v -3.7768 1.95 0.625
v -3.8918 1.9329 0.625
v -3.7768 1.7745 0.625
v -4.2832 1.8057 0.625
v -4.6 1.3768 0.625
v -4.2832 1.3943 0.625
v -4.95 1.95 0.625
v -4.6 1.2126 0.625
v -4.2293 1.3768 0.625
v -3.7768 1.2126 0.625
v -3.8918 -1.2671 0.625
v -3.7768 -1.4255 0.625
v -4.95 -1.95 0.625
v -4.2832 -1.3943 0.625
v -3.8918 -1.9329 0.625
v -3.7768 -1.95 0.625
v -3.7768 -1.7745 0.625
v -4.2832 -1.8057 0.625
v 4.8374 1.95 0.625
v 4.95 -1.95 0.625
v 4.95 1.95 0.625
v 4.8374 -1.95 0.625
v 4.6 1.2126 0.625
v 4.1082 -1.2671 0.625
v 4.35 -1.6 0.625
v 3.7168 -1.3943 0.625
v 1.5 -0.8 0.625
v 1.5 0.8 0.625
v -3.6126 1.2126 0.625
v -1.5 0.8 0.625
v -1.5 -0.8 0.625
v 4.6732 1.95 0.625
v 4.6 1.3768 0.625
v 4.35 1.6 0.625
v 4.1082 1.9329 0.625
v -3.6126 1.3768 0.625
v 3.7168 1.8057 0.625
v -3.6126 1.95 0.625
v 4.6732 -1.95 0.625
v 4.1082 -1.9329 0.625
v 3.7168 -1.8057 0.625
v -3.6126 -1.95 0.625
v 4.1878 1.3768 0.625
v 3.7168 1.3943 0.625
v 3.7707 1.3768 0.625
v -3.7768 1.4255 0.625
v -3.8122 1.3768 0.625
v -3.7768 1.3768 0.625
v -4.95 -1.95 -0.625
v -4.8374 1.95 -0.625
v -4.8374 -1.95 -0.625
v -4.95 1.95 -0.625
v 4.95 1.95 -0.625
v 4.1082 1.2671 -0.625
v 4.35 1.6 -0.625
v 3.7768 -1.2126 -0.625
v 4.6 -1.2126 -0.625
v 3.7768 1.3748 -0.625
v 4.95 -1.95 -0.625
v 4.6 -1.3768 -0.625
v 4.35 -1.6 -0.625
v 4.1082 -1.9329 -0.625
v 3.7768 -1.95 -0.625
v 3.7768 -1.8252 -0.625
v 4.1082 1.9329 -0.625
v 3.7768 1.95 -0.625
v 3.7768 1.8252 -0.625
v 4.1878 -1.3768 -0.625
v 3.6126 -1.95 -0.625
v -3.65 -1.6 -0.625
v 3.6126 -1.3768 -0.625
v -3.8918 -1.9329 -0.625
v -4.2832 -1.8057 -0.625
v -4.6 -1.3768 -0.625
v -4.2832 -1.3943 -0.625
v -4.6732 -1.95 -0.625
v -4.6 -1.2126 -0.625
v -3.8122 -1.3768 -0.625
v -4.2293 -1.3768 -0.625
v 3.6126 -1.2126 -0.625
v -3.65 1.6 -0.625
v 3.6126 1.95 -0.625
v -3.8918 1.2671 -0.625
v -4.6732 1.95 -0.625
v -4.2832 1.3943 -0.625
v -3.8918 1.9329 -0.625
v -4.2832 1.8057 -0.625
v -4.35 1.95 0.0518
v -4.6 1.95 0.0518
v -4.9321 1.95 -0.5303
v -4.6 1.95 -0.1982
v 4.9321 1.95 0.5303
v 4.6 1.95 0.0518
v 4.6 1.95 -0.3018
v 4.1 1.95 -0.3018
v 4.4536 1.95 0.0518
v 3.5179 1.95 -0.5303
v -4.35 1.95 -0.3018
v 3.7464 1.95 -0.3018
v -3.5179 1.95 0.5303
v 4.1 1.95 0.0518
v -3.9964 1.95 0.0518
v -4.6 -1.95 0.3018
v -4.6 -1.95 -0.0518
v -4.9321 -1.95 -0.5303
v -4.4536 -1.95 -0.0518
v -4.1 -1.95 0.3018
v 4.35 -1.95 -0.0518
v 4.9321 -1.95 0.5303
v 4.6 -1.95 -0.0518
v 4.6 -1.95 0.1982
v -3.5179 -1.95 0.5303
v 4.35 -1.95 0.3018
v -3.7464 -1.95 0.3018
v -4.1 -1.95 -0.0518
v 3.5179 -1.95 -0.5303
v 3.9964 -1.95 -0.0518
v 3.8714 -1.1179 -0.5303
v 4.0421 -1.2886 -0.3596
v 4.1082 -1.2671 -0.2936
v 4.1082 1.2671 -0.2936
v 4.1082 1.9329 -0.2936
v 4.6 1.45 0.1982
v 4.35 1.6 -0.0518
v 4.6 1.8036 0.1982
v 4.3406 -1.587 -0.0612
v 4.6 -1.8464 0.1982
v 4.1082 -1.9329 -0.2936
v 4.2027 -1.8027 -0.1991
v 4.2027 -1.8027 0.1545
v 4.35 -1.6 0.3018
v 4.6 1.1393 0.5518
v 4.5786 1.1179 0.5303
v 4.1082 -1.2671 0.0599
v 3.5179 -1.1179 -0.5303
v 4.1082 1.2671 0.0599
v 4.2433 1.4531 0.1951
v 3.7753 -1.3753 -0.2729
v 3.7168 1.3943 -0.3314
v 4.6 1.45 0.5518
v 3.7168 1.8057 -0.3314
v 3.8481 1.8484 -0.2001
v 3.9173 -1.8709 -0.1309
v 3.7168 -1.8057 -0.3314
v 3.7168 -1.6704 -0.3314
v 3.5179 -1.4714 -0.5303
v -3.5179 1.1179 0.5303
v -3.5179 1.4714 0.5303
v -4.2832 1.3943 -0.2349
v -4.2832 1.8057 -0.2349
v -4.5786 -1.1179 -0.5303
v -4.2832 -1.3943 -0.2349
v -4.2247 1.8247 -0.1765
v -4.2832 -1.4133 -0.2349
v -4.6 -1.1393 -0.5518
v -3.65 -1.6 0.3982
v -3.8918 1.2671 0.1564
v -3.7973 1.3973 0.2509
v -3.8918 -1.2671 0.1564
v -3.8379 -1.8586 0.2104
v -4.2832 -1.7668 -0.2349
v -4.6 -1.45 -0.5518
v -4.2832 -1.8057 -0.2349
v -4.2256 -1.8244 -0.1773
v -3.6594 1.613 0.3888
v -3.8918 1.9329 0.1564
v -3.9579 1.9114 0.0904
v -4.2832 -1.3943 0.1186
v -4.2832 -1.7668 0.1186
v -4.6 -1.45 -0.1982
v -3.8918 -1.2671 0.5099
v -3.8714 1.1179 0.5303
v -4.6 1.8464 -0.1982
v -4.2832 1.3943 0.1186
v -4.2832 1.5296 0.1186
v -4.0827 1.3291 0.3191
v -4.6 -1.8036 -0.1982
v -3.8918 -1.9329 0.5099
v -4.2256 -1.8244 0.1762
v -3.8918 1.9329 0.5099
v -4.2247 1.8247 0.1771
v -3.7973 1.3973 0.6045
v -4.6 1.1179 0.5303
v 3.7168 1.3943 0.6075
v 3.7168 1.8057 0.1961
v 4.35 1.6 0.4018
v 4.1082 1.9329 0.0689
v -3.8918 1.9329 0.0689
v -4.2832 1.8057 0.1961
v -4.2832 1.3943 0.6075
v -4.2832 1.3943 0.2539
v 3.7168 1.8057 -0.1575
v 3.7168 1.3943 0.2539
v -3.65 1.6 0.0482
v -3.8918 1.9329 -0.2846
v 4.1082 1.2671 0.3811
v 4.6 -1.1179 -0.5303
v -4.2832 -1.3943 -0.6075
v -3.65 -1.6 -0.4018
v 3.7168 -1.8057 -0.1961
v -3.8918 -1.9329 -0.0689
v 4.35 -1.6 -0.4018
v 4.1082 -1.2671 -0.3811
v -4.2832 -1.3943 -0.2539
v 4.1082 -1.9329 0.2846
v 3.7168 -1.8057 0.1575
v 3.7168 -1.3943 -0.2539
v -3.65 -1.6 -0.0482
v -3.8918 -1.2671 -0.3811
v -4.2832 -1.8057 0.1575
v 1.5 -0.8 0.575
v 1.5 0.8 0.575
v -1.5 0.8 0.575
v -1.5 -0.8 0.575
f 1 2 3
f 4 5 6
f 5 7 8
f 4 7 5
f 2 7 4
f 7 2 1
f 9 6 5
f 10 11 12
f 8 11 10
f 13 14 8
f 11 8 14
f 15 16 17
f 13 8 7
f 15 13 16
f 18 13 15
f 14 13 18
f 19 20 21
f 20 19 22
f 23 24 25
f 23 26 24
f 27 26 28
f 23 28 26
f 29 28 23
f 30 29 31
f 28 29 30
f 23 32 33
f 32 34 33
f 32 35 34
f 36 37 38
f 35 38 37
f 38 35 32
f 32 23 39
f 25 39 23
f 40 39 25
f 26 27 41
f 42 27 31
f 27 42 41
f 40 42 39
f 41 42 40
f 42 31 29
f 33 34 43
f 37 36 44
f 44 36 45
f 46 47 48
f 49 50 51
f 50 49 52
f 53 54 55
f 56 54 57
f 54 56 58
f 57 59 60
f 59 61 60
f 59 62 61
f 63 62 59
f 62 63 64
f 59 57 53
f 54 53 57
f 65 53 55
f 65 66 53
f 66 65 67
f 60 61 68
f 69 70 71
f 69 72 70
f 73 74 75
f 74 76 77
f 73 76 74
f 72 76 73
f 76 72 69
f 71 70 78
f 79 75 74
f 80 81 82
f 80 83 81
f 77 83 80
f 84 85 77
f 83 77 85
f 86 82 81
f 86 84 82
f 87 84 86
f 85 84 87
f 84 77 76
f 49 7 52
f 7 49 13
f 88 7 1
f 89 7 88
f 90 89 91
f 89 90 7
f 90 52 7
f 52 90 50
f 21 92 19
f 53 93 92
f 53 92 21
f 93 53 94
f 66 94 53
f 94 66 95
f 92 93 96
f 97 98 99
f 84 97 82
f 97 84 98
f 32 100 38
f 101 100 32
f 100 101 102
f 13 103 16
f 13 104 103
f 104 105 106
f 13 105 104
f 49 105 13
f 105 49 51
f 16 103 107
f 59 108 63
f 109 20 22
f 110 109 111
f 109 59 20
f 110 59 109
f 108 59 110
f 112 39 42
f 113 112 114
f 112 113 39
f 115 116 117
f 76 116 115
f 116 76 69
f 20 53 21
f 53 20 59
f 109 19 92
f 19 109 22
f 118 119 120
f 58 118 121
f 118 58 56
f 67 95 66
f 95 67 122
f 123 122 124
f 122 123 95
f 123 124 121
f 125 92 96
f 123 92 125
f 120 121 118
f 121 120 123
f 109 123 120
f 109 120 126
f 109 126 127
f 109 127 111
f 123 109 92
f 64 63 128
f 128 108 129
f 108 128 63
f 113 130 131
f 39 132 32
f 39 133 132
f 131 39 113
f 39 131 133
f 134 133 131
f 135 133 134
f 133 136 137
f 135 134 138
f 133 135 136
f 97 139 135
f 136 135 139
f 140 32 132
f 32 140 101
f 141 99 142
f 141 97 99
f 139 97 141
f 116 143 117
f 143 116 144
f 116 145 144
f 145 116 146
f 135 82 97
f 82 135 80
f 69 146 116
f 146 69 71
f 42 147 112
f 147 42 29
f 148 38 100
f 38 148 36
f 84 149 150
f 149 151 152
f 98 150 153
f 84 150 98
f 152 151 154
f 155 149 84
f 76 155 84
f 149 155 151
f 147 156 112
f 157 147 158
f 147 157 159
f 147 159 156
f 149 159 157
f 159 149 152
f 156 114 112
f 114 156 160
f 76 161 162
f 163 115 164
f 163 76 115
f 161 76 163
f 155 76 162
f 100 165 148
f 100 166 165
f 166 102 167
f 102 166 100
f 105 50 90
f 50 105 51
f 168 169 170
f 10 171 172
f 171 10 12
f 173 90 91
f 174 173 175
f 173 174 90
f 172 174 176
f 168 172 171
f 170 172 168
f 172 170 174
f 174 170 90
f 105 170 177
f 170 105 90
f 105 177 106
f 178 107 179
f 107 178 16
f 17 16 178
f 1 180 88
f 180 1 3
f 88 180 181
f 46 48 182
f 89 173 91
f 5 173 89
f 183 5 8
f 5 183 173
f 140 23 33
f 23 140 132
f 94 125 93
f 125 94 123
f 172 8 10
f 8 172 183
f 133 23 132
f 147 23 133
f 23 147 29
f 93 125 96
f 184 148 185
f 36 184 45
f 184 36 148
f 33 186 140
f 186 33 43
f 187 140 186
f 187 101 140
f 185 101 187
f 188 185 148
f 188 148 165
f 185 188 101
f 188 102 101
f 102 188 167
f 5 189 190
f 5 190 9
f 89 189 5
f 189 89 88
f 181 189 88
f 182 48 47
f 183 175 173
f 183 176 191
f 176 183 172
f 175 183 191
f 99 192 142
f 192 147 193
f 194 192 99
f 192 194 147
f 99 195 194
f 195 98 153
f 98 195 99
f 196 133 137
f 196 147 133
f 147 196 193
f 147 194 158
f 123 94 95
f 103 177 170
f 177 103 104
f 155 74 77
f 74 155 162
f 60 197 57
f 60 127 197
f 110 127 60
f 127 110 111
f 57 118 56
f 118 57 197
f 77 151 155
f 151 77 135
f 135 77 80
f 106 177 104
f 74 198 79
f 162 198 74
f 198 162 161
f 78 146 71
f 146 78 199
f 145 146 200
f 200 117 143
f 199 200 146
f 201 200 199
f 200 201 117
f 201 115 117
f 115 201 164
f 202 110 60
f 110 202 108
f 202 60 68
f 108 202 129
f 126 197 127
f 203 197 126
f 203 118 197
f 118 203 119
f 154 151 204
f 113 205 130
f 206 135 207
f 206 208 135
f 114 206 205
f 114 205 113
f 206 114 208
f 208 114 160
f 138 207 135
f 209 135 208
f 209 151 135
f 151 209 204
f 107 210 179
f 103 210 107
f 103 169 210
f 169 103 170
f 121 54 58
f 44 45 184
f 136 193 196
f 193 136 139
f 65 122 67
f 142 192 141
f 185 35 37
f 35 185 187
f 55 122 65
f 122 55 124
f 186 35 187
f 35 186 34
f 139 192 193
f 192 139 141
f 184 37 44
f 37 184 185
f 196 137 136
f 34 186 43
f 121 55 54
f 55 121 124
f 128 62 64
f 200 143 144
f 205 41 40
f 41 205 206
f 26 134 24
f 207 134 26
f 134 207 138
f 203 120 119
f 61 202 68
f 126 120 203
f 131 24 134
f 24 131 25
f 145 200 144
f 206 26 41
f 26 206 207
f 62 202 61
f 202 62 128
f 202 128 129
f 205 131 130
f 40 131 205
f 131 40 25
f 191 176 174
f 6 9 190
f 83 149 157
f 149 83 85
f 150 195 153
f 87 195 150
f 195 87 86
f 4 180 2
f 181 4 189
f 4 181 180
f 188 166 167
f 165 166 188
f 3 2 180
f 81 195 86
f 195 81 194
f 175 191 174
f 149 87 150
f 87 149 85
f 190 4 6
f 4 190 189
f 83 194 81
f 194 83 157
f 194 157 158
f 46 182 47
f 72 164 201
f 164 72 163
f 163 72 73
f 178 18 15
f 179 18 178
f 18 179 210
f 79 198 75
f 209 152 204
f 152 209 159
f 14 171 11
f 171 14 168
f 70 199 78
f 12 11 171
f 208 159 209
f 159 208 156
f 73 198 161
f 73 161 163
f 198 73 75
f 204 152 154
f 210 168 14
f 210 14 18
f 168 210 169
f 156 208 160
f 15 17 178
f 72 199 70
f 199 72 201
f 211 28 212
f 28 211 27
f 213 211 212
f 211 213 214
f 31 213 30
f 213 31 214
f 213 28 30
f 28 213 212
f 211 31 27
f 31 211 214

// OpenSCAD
// Parameters
body_L = 8.7; //[4.35:17.4:0.05]
body_W = 3.9; //[1.95:7.8:0.05]
body_H = 1.25; //[0.625:2.5:0.05]
term_L = 0.8; //[0.4:1.6:0.05]
term_thk = 0.08; //[0.04:0.2:0.01]
term_overlap = 0.6; //[0.3:1.2:0.05]
mark_L = 3.0; //[1.5:6.0:0.1]
mark_W = 1.6; //[0.8:3.2:0.1]
mark_depth = 0.05; //[0.02:0.15:0.01]
chamfer = 0.25; //[0.1:0.6:0.05]
fillet_r = 0.35; //[0.15:0.8:0.05]

// Base Shapes
module smd_body() {
  translate([0, 0, 0])
    cube([body_L, body_W, body_H], center=true);
}

module pin_term_left() {
  translate([-body_L/2 + (term_L + term_thk)/2 - term_overlap, 0, 0])
    cube([term_L + term_thk, body_W, body_H], center=true);
}

module pin_term_right() {
  translate([body_L/2 - (term_L + term_thk)/2 + term_overlap, 0, 0])
    cube([term_L + term_thk, body_W, body_H], center=true);
}

module top_marking_recess() {
  translate([0, 0, body_H/2 - mark_depth/2])
    cube([mark_L, mark_W, mark_depth], center=true);
}

module chamfer_wedge_xpos() {
  translate([body_L/2 - chamfer/2, 0, 0])
    rotate([0, 45, 0])
      cube([chamfer, body_W + 2*chamfer, body_H + 2*chamfer], center=true);
}

module chamfer_wedge_xneg() {
  translate([-body_L/2 + chamfer/2, 0, 0])
    rotate([0, 45, 0])
      cube([chamfer, body_W + 2*chamfer, body_H + 2*chamfer], center=true);
}

module chamfer_wedge_ypos() {
  translate([0, body_W/2 - chamfer/2, 0])
    rotate([45, 0, 0])
      cube([body_L + 2*chamfer, chamfer, body_H + 2*chamfer], center=true);
}

module chamfer_wedge_yneg() {
  translate([0, -body_W/2 + chamfer/2, 0])
    rotate([45, 0, 0])
      cube([body_L + 2*chamfer, chamfer, body_H + 2*chamfer], center=true);
}

module fillet_cyl_xpos_ypos() {
  translate([body_L/2 - fillet_r, body_W/2 - fillet_r, 0])
    cylinder(r=fillet_r, h=body_H + 2*fillet_r, center=true);
}

module fillet_cyl_xpos_yneg() {
  translate([body_L/2 - fillet_r, -body_W/2 + fillet_r, 0])
    cylinder(r=fillet_r, h=body_H + 2*fillet_r, center=true);
}

module fillet_cyl_xneg_ypos() {
  translate([-body_L/2 + fillet_r, body_W/2 - fillet_r, 0])
    cylinder(r=fillet_r, h=body_H + 2*fillet_r, center=true);
}

module fillet_cyl_xneg_yneg() {
  translate([-body_L/2 + fillet_r, -body_W/2 + fillet_r, 0])
    cylinder(r=fillet_r, h=body_H + 2*fillet_r, center=true);
}

// Operations
module pin_terminations() {
  union() {
    pin_term_left();
    pin_term_right();
  }
}

module edge_chamfers() {
  union() {
    chamfer_wedge_xpos();
    chamfer_wedge_xneg();
    chamfer_wedge_ypos();
    chamfer_wedge_yneg();
  }
}

module corner_fillets() {
  union() {
    fillet_cyl_xpos_ypos();
    fillet_cyl_xpos_yneg();
    fillet_cyl_xneg_ypos();
    fillet_cyl_xneg_yneg();
  }
}

module body_plus_terms() {
  union() {
    smd_body();
    pin_terminations();
  }
}

module body_with_chamfers() {
  difference() {
    body_plus_terms();
    edge_chamfers();
  }
}

module body_with_fillets() {
  difference() {
    body_with_chamfers();
    corner_fillets();
  }
}

module top_marking() {
  difference() {
    body_with_fillets();
    top_marking_recess();
  }
}

// Final Output
top_marking();
